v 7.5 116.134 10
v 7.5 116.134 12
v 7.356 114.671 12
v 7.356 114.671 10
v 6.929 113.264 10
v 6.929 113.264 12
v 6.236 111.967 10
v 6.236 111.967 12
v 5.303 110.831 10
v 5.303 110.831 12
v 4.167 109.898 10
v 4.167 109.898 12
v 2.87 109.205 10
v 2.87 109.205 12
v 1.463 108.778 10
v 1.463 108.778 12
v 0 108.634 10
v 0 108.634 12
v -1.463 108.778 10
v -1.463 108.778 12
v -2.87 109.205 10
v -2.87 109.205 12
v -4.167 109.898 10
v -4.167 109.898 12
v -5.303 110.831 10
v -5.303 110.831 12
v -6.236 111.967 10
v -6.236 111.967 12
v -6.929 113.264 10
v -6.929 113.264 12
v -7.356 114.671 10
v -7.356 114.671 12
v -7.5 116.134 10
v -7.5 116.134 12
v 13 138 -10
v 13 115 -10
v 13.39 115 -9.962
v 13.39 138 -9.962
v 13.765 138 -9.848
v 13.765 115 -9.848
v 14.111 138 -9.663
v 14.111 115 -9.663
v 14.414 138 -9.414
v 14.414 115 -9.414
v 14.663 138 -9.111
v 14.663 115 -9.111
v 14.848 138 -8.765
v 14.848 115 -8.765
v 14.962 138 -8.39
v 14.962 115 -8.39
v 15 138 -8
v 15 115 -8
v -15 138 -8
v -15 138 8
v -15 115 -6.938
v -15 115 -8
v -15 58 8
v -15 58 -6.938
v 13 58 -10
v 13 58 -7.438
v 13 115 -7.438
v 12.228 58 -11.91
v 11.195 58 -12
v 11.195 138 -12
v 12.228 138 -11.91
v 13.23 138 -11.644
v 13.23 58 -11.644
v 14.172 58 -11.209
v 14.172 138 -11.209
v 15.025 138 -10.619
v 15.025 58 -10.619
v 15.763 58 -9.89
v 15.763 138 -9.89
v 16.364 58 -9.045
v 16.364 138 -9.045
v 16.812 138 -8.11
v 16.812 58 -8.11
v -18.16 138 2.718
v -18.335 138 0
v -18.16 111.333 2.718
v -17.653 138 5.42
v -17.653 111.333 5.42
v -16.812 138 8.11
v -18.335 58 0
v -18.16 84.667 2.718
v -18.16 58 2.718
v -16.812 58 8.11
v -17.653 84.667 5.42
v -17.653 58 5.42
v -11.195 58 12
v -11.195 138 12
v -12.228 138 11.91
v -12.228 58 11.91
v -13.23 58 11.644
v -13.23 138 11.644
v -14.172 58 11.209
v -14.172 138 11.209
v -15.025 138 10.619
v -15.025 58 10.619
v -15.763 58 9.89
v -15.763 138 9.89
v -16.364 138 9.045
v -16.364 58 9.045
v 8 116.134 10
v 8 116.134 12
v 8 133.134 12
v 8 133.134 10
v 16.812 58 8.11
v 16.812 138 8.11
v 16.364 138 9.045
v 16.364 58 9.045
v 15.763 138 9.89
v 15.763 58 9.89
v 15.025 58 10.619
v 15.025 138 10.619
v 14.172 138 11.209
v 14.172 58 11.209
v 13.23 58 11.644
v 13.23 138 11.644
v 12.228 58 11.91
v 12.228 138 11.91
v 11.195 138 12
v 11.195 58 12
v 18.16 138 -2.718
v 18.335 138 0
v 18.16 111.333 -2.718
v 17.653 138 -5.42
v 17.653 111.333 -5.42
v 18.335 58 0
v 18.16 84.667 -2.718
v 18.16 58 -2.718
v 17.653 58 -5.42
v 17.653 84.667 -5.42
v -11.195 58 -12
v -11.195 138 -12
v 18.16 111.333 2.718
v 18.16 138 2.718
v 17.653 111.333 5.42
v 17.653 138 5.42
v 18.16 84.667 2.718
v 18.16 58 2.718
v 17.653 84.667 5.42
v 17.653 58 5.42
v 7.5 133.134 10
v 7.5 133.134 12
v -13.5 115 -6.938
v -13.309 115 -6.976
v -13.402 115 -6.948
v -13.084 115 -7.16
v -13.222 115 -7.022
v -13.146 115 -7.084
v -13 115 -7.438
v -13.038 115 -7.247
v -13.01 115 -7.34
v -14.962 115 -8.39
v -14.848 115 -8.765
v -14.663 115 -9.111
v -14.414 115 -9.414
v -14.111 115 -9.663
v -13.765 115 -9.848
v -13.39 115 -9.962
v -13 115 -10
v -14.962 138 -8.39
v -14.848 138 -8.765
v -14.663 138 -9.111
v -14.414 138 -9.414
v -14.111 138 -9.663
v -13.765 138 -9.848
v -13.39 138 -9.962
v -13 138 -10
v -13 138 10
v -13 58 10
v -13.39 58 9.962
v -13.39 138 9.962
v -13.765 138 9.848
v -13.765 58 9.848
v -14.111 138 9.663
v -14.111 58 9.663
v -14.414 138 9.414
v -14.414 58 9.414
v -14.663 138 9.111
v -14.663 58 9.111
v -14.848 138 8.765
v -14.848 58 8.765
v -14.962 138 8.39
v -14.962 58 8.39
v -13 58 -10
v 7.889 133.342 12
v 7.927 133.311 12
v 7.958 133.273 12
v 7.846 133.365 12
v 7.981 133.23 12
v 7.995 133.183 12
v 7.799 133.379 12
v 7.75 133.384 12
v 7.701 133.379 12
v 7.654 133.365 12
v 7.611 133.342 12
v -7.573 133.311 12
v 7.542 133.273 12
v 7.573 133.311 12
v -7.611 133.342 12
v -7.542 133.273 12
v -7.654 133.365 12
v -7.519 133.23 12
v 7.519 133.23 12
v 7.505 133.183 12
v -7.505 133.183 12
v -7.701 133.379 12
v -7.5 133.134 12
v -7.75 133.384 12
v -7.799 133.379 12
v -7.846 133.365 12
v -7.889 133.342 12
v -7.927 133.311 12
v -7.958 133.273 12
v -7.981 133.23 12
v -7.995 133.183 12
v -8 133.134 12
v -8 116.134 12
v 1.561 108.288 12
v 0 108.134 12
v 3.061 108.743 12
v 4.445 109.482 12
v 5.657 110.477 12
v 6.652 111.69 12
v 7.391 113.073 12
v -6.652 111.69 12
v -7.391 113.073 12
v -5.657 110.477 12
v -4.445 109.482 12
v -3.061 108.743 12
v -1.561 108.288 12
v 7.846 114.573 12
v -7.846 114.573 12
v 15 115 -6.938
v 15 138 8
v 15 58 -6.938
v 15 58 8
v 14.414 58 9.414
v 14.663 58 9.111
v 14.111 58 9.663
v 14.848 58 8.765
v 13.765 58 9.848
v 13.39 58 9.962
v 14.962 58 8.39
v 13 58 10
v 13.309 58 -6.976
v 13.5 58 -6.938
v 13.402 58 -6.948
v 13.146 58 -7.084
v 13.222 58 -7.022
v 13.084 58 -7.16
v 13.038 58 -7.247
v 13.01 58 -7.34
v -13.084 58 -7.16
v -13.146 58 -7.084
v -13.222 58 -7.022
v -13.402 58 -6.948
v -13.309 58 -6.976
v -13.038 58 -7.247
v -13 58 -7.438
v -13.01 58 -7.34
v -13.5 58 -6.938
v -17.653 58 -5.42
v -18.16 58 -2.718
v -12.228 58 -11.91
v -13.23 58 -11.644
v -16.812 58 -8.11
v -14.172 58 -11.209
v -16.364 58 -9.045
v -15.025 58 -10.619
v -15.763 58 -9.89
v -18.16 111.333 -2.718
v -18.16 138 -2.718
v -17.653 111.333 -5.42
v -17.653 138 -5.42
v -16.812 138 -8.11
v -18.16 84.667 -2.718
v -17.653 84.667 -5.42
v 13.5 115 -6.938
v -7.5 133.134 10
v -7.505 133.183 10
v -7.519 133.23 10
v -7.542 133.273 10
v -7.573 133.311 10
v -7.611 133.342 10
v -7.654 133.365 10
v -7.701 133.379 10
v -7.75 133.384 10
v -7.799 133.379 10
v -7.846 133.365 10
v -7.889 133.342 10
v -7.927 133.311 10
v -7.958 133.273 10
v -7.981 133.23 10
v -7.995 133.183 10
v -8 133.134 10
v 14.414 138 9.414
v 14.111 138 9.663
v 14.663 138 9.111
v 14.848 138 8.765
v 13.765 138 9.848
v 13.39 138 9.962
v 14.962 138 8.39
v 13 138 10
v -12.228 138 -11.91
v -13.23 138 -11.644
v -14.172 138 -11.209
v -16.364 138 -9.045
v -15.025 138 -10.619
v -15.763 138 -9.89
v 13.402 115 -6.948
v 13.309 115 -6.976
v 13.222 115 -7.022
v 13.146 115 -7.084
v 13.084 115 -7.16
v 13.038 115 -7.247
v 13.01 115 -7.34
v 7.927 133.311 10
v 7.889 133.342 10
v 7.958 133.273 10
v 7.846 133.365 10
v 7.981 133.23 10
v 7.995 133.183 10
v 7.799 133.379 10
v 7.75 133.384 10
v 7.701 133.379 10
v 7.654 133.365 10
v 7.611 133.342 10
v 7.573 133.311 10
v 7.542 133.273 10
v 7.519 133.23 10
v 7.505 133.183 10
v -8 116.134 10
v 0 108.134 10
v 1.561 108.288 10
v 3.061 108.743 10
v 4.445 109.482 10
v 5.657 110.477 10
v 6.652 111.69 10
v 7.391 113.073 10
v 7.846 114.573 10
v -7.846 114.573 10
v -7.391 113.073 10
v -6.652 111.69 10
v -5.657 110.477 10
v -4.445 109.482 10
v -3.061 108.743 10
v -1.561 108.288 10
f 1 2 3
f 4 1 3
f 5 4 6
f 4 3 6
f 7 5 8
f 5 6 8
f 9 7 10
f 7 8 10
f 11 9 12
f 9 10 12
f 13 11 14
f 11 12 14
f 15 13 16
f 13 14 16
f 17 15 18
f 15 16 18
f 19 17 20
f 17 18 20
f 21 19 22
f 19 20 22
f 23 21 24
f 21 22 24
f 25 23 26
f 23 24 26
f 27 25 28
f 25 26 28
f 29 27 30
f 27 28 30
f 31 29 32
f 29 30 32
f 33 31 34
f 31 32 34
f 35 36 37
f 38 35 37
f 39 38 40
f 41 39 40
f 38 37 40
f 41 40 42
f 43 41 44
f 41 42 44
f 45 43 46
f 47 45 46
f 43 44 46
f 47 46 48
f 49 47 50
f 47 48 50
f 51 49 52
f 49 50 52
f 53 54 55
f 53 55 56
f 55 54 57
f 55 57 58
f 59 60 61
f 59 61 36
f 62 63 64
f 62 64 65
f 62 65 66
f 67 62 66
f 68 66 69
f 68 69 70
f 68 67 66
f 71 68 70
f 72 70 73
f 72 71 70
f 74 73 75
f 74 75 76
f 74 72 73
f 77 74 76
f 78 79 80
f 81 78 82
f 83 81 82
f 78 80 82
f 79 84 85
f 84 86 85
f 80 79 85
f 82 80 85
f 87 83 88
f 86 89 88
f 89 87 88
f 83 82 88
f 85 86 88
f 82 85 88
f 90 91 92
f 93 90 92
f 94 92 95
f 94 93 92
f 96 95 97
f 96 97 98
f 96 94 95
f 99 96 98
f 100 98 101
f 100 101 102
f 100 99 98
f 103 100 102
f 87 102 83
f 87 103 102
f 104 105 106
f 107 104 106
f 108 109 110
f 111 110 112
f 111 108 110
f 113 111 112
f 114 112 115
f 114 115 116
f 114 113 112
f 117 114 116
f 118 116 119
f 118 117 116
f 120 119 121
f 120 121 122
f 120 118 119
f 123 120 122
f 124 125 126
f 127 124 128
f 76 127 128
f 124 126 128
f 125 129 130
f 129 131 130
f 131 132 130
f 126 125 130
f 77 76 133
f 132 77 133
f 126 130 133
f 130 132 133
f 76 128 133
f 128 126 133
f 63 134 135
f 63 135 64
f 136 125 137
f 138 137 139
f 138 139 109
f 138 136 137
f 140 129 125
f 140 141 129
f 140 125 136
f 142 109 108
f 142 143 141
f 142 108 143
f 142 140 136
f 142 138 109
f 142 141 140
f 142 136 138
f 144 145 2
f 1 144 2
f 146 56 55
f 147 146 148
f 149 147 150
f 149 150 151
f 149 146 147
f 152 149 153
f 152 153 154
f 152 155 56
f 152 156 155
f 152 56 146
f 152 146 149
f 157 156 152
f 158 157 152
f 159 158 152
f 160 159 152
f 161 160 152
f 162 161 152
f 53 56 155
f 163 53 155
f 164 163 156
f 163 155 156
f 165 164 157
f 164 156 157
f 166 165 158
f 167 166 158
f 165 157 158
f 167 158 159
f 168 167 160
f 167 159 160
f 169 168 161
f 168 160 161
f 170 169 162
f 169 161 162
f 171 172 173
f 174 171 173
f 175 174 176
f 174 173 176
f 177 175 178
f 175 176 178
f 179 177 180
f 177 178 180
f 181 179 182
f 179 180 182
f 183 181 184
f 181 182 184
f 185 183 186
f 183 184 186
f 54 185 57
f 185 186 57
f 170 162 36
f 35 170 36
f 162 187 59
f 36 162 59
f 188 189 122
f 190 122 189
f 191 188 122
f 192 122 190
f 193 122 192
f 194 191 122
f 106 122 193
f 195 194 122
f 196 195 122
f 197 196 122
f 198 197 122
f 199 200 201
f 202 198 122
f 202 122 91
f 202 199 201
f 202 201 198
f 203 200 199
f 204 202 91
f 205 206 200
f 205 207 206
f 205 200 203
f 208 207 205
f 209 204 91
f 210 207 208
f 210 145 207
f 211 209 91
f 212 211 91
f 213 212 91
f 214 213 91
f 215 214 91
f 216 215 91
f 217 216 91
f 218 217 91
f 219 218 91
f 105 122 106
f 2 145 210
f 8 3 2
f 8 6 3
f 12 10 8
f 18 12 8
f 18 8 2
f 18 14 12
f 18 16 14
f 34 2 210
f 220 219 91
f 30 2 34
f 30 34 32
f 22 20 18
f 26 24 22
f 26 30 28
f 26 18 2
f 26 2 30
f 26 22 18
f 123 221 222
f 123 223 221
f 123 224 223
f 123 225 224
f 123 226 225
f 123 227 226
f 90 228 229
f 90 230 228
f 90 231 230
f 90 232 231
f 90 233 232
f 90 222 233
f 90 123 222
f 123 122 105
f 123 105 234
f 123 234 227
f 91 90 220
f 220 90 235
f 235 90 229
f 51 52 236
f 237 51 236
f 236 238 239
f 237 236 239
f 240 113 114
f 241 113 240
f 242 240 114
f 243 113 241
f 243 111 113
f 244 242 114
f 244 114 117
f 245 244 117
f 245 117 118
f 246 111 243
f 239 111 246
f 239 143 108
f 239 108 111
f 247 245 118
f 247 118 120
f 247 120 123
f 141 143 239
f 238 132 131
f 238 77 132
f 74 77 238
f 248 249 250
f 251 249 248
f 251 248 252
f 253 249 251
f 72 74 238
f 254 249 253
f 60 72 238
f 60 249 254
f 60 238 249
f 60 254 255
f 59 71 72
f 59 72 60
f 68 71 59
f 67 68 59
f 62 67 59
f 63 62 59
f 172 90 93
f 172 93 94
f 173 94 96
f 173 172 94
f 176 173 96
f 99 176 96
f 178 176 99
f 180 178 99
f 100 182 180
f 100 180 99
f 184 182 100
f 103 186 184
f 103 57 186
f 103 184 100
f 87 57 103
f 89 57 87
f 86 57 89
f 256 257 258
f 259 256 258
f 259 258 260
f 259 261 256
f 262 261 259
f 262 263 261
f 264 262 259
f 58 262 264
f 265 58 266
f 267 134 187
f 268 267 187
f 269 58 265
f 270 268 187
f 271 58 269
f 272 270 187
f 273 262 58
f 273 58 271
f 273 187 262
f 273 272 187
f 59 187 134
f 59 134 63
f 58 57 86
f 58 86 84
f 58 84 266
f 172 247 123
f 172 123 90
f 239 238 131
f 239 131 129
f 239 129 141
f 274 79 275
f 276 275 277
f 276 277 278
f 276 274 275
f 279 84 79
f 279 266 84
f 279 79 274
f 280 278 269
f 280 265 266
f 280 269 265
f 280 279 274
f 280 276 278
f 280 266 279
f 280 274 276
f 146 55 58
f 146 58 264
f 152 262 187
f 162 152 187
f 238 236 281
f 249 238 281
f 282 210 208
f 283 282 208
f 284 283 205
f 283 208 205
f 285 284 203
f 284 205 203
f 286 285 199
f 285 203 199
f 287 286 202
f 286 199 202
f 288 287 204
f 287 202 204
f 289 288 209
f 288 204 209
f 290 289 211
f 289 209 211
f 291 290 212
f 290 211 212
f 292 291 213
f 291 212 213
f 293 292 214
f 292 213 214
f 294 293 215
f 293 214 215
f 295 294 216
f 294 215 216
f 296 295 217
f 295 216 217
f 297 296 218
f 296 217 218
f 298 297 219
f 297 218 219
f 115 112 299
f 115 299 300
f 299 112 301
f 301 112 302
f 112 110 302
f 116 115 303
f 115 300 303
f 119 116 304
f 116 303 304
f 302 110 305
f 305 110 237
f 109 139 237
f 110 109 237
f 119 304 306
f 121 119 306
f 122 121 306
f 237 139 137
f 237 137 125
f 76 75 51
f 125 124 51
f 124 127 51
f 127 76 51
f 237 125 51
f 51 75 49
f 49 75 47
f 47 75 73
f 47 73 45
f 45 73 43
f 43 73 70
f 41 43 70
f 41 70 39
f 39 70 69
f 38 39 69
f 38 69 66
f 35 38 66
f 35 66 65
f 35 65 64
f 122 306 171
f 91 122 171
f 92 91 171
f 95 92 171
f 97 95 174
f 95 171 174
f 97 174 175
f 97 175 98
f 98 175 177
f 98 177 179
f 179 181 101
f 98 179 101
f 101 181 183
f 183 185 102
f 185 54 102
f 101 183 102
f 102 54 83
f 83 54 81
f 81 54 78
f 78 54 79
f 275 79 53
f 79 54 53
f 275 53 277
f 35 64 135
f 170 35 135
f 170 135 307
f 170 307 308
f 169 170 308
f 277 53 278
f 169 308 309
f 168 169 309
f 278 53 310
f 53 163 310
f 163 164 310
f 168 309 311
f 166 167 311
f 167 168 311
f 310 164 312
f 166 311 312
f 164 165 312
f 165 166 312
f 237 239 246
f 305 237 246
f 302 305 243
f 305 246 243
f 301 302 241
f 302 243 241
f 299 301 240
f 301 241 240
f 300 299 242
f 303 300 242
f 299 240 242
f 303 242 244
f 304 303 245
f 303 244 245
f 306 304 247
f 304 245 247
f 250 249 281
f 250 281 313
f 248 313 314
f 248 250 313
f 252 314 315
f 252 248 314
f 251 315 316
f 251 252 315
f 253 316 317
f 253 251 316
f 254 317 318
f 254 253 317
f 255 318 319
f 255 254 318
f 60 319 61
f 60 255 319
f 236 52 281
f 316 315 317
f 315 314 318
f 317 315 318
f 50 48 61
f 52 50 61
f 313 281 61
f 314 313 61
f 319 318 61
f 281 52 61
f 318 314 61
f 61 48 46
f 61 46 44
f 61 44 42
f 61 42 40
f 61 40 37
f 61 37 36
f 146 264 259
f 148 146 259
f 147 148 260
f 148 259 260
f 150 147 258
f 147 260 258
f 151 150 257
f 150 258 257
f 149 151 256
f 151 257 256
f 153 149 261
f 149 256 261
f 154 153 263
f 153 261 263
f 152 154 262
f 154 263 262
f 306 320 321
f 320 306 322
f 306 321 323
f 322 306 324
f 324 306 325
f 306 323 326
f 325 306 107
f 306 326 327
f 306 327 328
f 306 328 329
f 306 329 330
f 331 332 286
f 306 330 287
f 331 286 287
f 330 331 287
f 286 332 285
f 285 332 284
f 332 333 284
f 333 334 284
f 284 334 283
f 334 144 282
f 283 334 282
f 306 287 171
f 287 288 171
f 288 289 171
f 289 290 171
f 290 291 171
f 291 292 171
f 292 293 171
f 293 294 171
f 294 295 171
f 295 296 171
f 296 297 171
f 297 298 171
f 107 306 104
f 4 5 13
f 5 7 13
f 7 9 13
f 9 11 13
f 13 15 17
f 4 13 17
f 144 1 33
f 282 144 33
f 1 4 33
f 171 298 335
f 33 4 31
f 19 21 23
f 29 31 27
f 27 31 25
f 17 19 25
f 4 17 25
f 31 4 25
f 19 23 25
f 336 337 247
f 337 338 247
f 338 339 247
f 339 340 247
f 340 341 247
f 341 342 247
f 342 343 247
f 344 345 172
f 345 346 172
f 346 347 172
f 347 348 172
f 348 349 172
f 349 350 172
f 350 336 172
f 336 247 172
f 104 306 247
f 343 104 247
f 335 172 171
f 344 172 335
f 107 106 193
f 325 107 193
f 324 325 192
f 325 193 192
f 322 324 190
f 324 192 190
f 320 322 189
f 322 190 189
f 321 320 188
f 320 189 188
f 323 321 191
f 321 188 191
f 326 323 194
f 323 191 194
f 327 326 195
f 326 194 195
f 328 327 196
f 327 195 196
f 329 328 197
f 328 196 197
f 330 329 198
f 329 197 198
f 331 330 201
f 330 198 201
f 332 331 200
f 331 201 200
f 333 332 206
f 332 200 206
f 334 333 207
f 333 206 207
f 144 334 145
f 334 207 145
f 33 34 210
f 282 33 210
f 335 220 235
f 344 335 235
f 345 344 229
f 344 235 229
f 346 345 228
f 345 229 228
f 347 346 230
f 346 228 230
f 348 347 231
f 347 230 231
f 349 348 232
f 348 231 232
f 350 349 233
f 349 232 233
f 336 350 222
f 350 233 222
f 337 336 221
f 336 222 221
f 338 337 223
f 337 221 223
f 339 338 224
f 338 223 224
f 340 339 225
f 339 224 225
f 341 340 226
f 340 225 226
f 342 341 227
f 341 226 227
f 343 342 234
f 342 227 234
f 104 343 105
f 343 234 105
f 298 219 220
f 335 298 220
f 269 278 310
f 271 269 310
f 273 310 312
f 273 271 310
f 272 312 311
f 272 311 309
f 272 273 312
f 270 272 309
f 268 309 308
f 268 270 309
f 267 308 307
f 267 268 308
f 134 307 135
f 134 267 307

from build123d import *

# Parameters (mm, degrees)
BOSS_EXTRUDE4_DEPTH = 80
BOSS_EXTRUDE5_DEPTH = 57
CUT_EXTRUDE1_DEPTH  = 2


with BuildPart() as part:
    # Sketch8 → Boss-Extrude4 (new body)
    with BuildSketch(Plane(origin=(0, 58, 0), x_dir=(1, 0, 0), z_dir=(0, 1, 0))):
        with BuildLine():
            Line((-11.194828593, 12.000000011), (11.194828559, 12.000000011))
            ThreePointArc((11.194828559, 12.000000011), (14.611088941, 10.932460351), (16.811684841, 8.109721678))
            add(Edge.make_bspline(
                [(18.334712564, 1.1e-08), (18.327162677, 2.726130673), (17.819510816, 5.426517656), (16.811684841, 8.109721678)],
                knots=[0.502499344, 0.502499344, 0.502499344, 0.502499344, 0.837905074, 0.837905074, 0.837905074, 0.837905074], degree=3))
            add(Edge.make_bspline(
                [(18.334712564, 1.1e-08), (18.327162677, -2.72613065), (17.819510816, -5.426517634), (16.811684841, -8.109721656)],
                knots=[0.502499344, 0.502499344, 0.502499344, 0.502499344, 0.837905074, 0.837905074, 0.837905074, 0.837905074], degree=3))
            ThreePointArc((16.811684841, -8.109721656), (14.611088941, -10.932460328), (11.194828559, -11.999999989))
            Line((11.194828559, -11.999999989), (-11.194828593, -11.999999989))
            ThreePointArc((-11.194828593, -11.999999989), (-14.611088975, -10.932460328), (-16.811684874, -8.109721656))
            add(Edge.make_bspline(
                [(-18.334712598, 1.1e-08), (-18.327162711, -2.72613065), (-17.81951085, -5.426517634), (-16.811684874, -8.109721656)],
                knots=[0.502499344, 0.502499344, 0.502499344, 0.502499344, 0.837905074, 0.837905074, 0.837905074, 0.837905074], degree=3))
            add(Edge.make_bspline(
                [(-18.334712598, 1.1e-08), (-18.327162711, 2.726130673), (-17.81951085, 5.426517656), (-16.811684874, 8.109721678)],
                knots=[0.502499344, 0.502499344, 0.502499344, 0.502499344, 0.837905074, 0.837905074, 0.837905074, 0.837905074], degree=3))
            ThreePointArc((-16.811684874, 8.109721678), (-14.611088975, 10.932460351), (-11.194828593, 12.000000011))
        make_face()
        with BuildLine():
            Line((-15.000000017, -7.999999989), (-15.000000017, 8.000000011))
            ThreePointArc((-15.000000017, 8.000000011), (-14.414213579, 9.414213574), (-13.000000017, 10.000000011))
            Line((-13.000000017, 10.000000011), (12.999999983, 10.000000011))
            ThreePointArc((12.999999983, 10.000000011), (14.414213546, 9.414213574), (14.999999983, 8.000000011))
            Line((14.999999983, 8.000000011), (14.999999983, -7.999999989))
            ThreePointArc((14.999999983, -7.999999989), (14.414213546, -9.414213551), (12.999999983, -9.999999989))
            Line((12.999999983, -9.999999989), (-13.000000017, -9.999999989))
            ThreePointArc((-13.000000017, -9.999999989), (-14.414213579, -9.414213551), (-15.000000017, -7.999999989))
        make_face(mode=Mode.SUBTRACT)
    extrude(amount=BOSS_EXTRUDE4_DEPTH)

    # Sketch11 → Boss-Extrude5 (add)
    with BuildSketch(Plane(origin=(0, 58, 0), x_dir=(1, 0, 0), z_dir=(0, 1, 0))):
        with BuildLine():
            Line((13, 10.000000011), (15, 10.000000011))
            Line((15, 10.000000011), (15, 6.937911183))
            Line((15, 6.937911183), (13.5, 6.937911183))
            ThreePointArc((13.5, 6.937911183), (13.146446609, 7.084357793), (13, 7.437911183))
            Line((13, 7.437911183), (13, 10.000000011))
        make_face()
        with BuildLine():
            Line((-13, 7.437911183), (-13, 10.000000011))
            Line((-13, 10.000000011), (-15, 10.000000011))
            Line((-15, 10.000000011), (-15, 6.937911183))
            Line((-15, 6.937911183), (-13.5, 6.937911183))
            ThreePointArc((-13.5, 6.937911183), (-13.146446609, 7.084357793), (-13, 7.437911183))
        make_face()
    extrude(amount=BOSS_EXTRUDE5_DEPTH)

    # Sketch12 → Cut-Extrude1 (cut)
    with BuildSketch(Plane.XY.offset(11.999999989)):
        with BuildLine():
            Line((7.5, 133.134156445), (7.5, 116.134156445))
            ThreePointArc((7.5, 116.134156445), (0, 108.634156445), (-7.5, 116.134156445))
            Line((-7.5, 116.134156445), (-7.5, 133.134156445))
            ThreePointArc((-7.5, 133.134156445), (-7.75, 133.384156445), (-8, 133.134156445))
            Line((-8, 133.134156445), (-8, 116.134156445))
            ThreePointArc((-8, 116.134156445), (0, 108.134156445), (8, 116.134156445))
            Line((8, 116.134156445), (8, 133.134156445))
            ThreePointArc((8, 133.134156445), (7.75, 133.384156445), (7.5, 133.134156445))
        make_face()
    extrude(amount=-CUT_EXTRUDE1_DEPTH, mode=Mode.SUBTRACT)


solid = part.part
